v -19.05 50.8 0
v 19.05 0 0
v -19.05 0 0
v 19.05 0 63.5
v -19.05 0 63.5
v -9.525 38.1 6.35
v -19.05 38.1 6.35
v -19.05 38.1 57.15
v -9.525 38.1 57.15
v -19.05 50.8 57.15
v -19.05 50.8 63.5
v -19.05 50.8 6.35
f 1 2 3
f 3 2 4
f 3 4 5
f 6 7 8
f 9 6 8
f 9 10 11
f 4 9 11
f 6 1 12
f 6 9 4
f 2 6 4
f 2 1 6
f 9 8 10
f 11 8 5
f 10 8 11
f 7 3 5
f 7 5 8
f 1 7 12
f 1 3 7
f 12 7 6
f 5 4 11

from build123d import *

# Parameters (mm, degrees)
BOSS_EXTRUDE1_DEPTH = 63.5
SKETCH2_W           = 50.8
SKETCH2_H           = 12.7
CUT_EXTRUDE2_DEPTH  = 39.1


with BuildPart() as part:
    # Sketch1 → Boss-Extrude1 (new body)
    with BuildSketch(Plane.XY):
        Polygon((19.05, 0), (-19.05, 0), (-19.05, 50.8), align=None)
    extrude(amount=BOSS_EXTRUDE1_DEPTH)

    # Sketch2 → Cut-Extrude2 (cut, through all)
    with BuildSketch(Plane.ZY.offset(19.05)):
        with Locations((31.75, 44.45)):
            Rectangle(SKETCH2_W, SKETCH2_H)
    extrude(amount=-CUT_EXTRUDE2_DEPTH, mode=Mode.SUBTRACT)


solid = part.part
